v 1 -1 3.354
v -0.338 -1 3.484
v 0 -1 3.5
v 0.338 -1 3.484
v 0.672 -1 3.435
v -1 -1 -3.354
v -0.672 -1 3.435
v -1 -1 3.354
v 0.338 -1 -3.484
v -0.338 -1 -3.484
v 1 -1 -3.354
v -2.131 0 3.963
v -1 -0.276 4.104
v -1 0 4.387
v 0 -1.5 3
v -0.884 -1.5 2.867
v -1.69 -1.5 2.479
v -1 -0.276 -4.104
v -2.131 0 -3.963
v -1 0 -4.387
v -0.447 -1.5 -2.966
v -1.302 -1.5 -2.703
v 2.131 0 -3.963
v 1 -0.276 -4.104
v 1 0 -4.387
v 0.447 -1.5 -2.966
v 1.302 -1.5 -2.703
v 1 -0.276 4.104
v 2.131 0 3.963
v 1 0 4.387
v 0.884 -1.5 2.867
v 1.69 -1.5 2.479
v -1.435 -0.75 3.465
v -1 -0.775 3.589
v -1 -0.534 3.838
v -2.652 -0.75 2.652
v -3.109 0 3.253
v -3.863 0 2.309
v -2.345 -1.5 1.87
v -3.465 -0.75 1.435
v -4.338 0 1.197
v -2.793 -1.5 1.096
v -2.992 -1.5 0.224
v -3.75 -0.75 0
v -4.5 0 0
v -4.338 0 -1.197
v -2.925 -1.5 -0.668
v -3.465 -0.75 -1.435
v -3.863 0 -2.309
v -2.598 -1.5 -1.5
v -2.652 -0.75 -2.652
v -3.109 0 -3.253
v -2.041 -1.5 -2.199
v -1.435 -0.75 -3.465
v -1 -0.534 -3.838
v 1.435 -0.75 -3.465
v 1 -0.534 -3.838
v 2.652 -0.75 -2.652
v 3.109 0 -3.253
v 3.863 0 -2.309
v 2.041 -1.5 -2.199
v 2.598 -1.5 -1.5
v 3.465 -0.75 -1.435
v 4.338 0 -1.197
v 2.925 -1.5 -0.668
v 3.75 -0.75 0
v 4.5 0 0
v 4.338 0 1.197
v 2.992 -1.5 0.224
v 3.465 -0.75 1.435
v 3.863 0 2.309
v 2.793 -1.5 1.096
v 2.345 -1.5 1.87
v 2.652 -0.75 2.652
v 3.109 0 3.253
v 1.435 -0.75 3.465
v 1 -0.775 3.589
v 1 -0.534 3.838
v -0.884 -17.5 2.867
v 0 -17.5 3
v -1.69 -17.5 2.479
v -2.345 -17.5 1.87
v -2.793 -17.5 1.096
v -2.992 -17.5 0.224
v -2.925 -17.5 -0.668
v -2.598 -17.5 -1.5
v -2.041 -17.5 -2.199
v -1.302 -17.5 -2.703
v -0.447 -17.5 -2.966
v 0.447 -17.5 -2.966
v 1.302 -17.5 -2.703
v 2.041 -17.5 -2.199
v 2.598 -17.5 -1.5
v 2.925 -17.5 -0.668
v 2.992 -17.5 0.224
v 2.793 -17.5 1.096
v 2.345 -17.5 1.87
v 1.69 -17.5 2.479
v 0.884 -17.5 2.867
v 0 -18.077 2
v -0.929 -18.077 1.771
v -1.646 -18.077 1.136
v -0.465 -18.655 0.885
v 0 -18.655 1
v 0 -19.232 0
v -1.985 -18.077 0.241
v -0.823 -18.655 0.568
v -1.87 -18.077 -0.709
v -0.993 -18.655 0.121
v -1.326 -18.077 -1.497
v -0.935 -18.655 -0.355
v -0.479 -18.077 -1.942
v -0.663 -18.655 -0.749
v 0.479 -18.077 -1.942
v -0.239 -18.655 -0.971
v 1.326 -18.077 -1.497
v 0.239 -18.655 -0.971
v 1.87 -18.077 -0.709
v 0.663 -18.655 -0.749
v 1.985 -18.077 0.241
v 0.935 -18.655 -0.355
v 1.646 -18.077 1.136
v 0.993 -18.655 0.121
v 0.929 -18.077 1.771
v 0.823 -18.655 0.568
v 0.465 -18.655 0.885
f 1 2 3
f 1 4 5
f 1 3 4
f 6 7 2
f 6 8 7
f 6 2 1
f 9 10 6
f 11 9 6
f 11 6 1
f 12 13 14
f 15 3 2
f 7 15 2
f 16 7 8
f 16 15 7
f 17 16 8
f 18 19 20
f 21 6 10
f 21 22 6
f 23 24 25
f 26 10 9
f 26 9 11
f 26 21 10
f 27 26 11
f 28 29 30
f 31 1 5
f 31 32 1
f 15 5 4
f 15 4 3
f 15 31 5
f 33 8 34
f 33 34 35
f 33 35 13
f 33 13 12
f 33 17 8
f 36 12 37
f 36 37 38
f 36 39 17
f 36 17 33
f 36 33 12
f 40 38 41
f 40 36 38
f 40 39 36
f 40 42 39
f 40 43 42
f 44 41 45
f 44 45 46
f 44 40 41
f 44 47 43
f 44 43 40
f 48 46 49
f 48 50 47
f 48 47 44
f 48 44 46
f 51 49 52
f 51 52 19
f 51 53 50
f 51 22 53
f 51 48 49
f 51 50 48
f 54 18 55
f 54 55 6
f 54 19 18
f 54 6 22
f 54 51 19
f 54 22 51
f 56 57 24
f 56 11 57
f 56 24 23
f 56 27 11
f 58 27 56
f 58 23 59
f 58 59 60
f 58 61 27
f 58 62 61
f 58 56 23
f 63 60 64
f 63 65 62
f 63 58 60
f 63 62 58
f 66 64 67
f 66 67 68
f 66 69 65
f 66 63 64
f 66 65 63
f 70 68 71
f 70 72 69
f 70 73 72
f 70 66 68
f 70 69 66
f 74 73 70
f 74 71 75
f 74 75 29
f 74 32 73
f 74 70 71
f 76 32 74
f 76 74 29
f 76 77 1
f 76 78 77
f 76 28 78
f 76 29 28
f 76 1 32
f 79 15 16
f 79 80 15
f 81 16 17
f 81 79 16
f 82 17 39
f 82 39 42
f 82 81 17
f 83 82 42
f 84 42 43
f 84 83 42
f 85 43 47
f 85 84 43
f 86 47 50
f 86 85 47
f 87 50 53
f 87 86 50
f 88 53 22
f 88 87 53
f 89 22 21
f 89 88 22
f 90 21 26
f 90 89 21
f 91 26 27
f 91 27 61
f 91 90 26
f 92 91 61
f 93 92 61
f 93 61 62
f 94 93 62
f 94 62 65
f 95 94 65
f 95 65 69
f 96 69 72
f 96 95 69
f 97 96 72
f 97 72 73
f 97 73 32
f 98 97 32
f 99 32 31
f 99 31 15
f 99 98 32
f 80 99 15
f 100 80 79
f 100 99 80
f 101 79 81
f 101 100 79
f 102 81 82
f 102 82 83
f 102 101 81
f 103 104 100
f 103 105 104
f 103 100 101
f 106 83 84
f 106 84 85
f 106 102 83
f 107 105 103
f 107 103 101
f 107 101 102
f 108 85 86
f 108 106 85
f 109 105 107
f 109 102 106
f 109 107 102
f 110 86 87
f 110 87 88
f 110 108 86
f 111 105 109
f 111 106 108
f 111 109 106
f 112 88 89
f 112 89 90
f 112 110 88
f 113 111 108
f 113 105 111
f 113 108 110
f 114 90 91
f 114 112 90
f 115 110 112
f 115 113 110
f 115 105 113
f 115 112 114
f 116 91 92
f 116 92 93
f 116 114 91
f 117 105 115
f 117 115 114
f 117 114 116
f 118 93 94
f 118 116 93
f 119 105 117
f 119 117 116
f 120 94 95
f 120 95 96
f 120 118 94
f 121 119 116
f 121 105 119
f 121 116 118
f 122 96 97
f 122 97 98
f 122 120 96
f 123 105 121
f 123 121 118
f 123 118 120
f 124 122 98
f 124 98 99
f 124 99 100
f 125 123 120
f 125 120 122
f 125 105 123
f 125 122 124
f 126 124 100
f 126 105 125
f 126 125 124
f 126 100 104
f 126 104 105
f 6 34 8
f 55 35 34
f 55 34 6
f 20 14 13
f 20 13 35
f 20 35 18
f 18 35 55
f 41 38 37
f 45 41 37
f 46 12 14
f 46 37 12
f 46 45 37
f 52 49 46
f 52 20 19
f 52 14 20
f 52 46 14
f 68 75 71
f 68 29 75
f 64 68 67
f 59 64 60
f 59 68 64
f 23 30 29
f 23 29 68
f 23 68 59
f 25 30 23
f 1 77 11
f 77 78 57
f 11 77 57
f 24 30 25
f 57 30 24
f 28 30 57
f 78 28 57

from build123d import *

# Parameters (mm, degrees)
SKETCH2_W      = 2
SKETCH2_H      = 9.797583912
EXTRUDE1_DEPTH = 1


with BuildPart() as part:
    # Sketch1 → Revolve1 (revolve)
    with BuildSketch(Plane.XY, mode=Mode.PRIVATE) as revolve1_sk:
        Polygon((0, 0), (-4.5, 0), (-3, -1.5), (-3, -17.5), (0, -19.232050808), (0, -17.5), align=None)
    revolve(revolve1_sk.sketch.rotate(Axis((0, 0, 0), (0, -1, 0)), 270), axis=Axis((0, 0, 0), (0, -1, 0)))

    # Sketch2 → Extrude1 (cut)
    with BuildSketch(Plane(origin=(0, 0, 0), x_dir=(1, 0, 0), z_dir=(0, 1, 0))):
        with Locations((0, -0.007322559)):
            Rectangle(SKETCH2_W, SKETCH2_H)
    extrude(amount=-EXTRUDE1_DEPTH, mode=Mode.SUBTRACT)


solid = part.part
